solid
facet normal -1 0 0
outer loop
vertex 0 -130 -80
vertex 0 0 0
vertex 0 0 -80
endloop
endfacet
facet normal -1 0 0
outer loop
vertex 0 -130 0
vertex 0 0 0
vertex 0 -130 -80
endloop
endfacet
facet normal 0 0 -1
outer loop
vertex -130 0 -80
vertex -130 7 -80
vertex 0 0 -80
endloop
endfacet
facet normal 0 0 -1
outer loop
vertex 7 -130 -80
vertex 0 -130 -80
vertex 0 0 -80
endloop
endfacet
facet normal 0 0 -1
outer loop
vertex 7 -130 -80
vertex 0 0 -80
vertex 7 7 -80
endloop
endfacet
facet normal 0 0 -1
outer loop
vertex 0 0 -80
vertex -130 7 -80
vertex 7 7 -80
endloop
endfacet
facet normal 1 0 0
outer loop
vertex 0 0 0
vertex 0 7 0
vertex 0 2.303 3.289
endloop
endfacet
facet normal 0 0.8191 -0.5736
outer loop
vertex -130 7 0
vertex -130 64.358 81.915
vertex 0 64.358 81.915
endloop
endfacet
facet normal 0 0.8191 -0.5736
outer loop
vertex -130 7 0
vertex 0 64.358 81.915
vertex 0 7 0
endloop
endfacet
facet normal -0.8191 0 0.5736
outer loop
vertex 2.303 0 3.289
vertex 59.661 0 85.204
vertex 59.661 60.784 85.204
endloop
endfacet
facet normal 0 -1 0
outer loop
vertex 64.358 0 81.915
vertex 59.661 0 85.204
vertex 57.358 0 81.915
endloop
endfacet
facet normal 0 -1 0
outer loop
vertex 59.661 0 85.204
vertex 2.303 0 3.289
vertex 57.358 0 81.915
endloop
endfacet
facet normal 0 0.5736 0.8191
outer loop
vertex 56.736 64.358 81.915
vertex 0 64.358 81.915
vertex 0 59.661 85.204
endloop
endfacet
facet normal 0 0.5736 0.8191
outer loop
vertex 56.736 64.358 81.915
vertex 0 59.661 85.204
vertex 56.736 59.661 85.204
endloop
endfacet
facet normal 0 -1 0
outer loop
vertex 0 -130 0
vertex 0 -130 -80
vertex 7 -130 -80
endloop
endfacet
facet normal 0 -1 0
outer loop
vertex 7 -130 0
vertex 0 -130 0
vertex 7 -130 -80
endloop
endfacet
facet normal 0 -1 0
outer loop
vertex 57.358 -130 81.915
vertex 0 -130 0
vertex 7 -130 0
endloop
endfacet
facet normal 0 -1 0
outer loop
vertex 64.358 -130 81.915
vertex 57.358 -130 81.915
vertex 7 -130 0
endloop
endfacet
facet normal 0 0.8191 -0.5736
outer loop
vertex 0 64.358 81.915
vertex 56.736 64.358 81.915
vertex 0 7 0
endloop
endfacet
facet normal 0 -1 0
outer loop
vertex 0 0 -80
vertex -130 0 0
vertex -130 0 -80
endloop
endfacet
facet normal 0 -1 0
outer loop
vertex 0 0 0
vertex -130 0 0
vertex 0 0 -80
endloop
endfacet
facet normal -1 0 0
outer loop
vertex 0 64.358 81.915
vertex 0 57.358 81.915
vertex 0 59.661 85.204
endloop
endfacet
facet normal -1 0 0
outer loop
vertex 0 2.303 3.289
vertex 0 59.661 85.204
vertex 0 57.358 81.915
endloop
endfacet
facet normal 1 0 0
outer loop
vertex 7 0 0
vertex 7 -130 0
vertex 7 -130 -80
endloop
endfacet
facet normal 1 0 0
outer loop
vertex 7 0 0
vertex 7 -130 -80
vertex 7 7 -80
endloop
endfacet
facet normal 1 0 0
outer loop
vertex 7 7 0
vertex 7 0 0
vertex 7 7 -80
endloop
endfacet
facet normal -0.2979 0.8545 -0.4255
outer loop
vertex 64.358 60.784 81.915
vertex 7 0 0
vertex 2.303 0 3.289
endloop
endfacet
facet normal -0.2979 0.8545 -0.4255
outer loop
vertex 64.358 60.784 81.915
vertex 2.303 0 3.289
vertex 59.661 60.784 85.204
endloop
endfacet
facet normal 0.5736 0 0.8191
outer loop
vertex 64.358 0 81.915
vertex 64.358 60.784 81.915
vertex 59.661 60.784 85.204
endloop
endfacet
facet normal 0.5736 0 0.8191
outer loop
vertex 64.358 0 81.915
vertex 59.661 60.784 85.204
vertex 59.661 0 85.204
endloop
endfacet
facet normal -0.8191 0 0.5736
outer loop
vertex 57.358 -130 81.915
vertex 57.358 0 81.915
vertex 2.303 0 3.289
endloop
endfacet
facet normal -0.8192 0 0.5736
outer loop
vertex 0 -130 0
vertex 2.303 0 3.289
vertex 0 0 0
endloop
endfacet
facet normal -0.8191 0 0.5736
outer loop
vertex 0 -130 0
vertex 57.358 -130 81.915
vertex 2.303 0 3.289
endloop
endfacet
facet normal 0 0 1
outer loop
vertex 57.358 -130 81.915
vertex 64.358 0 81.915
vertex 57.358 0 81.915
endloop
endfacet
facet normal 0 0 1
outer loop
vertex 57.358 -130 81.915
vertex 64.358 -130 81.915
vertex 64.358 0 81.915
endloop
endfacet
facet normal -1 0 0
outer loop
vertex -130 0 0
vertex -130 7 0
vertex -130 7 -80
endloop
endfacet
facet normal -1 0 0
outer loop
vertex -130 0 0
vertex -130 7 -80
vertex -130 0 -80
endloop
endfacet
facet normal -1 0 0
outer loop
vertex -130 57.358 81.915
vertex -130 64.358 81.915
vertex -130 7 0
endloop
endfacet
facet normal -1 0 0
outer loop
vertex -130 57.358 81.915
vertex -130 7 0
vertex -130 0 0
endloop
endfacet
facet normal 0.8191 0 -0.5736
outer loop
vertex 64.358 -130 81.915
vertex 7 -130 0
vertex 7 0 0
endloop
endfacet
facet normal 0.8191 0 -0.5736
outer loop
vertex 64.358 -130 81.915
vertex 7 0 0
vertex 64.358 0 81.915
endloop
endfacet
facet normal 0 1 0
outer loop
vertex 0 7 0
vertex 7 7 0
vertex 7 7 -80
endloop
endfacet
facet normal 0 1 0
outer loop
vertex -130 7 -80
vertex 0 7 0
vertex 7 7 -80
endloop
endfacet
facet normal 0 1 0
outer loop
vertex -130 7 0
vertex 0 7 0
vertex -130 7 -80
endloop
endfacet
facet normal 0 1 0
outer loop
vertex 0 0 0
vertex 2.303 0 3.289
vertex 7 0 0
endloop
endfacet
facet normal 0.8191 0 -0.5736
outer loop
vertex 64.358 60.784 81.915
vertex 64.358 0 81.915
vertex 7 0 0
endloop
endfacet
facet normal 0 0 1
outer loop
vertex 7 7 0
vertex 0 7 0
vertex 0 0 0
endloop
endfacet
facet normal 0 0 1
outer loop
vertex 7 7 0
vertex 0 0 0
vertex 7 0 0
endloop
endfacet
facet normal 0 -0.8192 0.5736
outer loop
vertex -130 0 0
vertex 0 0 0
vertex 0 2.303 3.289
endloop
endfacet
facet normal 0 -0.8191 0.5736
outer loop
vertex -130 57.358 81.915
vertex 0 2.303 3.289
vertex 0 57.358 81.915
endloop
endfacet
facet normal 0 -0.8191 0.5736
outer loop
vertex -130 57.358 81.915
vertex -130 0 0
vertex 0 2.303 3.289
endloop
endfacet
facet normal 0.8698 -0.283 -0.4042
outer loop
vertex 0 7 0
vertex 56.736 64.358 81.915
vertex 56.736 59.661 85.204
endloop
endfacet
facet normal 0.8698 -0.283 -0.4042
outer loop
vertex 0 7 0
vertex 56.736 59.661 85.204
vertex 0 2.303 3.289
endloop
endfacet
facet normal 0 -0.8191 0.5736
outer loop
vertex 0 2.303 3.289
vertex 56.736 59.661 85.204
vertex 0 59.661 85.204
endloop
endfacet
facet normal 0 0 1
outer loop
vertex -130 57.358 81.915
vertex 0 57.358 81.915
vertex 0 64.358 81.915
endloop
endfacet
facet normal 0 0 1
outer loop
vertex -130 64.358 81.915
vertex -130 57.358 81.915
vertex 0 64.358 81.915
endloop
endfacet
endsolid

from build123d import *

# Parameters (mm, degrees)
F1_DEPTH = 80
F3_DEPTH = 130
F5_DEPTH = 130
F7_DEPTH = 5.734064
F9_DEPTH = 5.734064


with BuildPart() as f1:
    # F0 (on Top) → F1 (new body)
    with BuildSketch(Plane.XY):
        Polygon((-130, 7), (-130, 0), (0, 0), (0, -130), (7, -130), (7, 7), align=None)
    extrude(amount=-F1_DEPTH)

    # F2 (on face) → F3 (join)
    with BuildSketch(Plane.XZ.offset(130)):
        Polygon((57.357644, 81.915204), (0, 0), (7, 0), (64.357644, 81.915204), align=None)
    extrude(amount=-F3_DEPTH)

    # F4 (on face) → F5 (join)
    with BuildSketch(Plane(origin=(-130, 0, 0), x_dir=(0, -1, 0), z_dir=(-1, 0, 0))):
        Polygon((-7, 0), (0, 0), (-57.357644, 81.915204), (-64.357644, 81.915204), align=None)
    extrude(amount=-F5_DEPTH)

    # F6 (on face) → F7 (join, through all)
    with BuildSketch(Plane(origin=(4.697071, 0, -3.288924), x_dir=(0, 1, 0), z_dir=(0.819152, 0, -0.573576))):
        Polygon((60.783785, 104.015035), (0, 104.015035), (0, 4.015035), align=None)
    extrude(amount=-F7_DEPTH)

    # F8 (on face) → F9 (join, through all)
    with BuildSketch(Plane(origin=(0, 4.697071, -3.288924), x_dir=(-1, 0, 0), z_dir=(0, 0.819152, -0.573576))):
        Polygon((0, 4.015035), (0, 104.015035), (-56.736283, 104.015035), align=None)
    extrude(amount=-F9_DEPTH)


solid = f1.part
